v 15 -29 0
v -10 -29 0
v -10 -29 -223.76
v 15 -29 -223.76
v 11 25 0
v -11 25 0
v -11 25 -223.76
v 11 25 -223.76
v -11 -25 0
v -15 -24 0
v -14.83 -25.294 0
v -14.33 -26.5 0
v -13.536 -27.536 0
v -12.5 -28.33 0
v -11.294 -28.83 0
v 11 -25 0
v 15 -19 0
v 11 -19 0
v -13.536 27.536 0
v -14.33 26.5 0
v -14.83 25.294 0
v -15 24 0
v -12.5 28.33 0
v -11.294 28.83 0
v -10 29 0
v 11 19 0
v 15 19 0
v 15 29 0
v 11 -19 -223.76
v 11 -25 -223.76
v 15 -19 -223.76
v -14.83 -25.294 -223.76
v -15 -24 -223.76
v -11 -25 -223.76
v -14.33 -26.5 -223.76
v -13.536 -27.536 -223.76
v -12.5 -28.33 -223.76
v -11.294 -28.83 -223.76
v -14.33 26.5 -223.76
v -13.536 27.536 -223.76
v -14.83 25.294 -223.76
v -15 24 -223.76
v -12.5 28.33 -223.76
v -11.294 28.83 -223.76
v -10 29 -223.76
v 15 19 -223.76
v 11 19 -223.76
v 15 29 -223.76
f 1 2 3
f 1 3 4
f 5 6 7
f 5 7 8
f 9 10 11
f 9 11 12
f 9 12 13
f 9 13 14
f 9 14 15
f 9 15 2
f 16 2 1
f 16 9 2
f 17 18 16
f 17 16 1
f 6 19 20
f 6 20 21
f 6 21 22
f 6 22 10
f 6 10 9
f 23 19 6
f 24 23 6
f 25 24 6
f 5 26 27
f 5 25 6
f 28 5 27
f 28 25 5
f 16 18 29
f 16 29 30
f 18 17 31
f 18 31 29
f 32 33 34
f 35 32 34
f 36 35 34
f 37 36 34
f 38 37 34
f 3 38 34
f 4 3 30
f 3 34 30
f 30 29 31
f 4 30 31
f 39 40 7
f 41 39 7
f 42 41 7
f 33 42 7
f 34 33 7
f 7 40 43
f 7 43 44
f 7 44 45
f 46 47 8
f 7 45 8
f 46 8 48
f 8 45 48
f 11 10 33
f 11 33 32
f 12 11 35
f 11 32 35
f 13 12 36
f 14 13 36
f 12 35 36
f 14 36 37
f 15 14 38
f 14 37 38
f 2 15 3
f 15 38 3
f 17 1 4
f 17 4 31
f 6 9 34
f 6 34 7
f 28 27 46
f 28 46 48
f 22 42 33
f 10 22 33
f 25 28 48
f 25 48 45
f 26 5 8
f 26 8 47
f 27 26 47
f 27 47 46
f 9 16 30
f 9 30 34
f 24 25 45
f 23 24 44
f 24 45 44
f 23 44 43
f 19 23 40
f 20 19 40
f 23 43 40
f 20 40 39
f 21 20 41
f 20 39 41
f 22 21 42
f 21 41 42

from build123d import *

# Parameters (mm, degrees)
SALIENTE_EXTRUIR1_DEPTH = 223.76
REDONDEO2_R             = 5


with BuildPart() as part:
    # Croquis1 → Saliente-Extruir1 (new body)
    with BuildSketch(Plane.XY):
        Polygon((11, 19), (15, 19), (15, 29), (-15, 29), (-15, -29), (15, -29), (15, -19), (11, -19), (11, -25), (-11, -25), (-11, 25), (11, 25), align=None)
    extrude(amount=-SALIENTE_EXTRUIR1_DEPTH)

    # Redondeo2
    redondeo2_edges = [part.edges().sort_by_distance(p)[0] for p in [
        (-15, 29, -111.88),
        (-15, -29, -111.88),
    ]]
    fillet(redondeo2_edges, radius=REDONDEO2_R)


solid = part.part
